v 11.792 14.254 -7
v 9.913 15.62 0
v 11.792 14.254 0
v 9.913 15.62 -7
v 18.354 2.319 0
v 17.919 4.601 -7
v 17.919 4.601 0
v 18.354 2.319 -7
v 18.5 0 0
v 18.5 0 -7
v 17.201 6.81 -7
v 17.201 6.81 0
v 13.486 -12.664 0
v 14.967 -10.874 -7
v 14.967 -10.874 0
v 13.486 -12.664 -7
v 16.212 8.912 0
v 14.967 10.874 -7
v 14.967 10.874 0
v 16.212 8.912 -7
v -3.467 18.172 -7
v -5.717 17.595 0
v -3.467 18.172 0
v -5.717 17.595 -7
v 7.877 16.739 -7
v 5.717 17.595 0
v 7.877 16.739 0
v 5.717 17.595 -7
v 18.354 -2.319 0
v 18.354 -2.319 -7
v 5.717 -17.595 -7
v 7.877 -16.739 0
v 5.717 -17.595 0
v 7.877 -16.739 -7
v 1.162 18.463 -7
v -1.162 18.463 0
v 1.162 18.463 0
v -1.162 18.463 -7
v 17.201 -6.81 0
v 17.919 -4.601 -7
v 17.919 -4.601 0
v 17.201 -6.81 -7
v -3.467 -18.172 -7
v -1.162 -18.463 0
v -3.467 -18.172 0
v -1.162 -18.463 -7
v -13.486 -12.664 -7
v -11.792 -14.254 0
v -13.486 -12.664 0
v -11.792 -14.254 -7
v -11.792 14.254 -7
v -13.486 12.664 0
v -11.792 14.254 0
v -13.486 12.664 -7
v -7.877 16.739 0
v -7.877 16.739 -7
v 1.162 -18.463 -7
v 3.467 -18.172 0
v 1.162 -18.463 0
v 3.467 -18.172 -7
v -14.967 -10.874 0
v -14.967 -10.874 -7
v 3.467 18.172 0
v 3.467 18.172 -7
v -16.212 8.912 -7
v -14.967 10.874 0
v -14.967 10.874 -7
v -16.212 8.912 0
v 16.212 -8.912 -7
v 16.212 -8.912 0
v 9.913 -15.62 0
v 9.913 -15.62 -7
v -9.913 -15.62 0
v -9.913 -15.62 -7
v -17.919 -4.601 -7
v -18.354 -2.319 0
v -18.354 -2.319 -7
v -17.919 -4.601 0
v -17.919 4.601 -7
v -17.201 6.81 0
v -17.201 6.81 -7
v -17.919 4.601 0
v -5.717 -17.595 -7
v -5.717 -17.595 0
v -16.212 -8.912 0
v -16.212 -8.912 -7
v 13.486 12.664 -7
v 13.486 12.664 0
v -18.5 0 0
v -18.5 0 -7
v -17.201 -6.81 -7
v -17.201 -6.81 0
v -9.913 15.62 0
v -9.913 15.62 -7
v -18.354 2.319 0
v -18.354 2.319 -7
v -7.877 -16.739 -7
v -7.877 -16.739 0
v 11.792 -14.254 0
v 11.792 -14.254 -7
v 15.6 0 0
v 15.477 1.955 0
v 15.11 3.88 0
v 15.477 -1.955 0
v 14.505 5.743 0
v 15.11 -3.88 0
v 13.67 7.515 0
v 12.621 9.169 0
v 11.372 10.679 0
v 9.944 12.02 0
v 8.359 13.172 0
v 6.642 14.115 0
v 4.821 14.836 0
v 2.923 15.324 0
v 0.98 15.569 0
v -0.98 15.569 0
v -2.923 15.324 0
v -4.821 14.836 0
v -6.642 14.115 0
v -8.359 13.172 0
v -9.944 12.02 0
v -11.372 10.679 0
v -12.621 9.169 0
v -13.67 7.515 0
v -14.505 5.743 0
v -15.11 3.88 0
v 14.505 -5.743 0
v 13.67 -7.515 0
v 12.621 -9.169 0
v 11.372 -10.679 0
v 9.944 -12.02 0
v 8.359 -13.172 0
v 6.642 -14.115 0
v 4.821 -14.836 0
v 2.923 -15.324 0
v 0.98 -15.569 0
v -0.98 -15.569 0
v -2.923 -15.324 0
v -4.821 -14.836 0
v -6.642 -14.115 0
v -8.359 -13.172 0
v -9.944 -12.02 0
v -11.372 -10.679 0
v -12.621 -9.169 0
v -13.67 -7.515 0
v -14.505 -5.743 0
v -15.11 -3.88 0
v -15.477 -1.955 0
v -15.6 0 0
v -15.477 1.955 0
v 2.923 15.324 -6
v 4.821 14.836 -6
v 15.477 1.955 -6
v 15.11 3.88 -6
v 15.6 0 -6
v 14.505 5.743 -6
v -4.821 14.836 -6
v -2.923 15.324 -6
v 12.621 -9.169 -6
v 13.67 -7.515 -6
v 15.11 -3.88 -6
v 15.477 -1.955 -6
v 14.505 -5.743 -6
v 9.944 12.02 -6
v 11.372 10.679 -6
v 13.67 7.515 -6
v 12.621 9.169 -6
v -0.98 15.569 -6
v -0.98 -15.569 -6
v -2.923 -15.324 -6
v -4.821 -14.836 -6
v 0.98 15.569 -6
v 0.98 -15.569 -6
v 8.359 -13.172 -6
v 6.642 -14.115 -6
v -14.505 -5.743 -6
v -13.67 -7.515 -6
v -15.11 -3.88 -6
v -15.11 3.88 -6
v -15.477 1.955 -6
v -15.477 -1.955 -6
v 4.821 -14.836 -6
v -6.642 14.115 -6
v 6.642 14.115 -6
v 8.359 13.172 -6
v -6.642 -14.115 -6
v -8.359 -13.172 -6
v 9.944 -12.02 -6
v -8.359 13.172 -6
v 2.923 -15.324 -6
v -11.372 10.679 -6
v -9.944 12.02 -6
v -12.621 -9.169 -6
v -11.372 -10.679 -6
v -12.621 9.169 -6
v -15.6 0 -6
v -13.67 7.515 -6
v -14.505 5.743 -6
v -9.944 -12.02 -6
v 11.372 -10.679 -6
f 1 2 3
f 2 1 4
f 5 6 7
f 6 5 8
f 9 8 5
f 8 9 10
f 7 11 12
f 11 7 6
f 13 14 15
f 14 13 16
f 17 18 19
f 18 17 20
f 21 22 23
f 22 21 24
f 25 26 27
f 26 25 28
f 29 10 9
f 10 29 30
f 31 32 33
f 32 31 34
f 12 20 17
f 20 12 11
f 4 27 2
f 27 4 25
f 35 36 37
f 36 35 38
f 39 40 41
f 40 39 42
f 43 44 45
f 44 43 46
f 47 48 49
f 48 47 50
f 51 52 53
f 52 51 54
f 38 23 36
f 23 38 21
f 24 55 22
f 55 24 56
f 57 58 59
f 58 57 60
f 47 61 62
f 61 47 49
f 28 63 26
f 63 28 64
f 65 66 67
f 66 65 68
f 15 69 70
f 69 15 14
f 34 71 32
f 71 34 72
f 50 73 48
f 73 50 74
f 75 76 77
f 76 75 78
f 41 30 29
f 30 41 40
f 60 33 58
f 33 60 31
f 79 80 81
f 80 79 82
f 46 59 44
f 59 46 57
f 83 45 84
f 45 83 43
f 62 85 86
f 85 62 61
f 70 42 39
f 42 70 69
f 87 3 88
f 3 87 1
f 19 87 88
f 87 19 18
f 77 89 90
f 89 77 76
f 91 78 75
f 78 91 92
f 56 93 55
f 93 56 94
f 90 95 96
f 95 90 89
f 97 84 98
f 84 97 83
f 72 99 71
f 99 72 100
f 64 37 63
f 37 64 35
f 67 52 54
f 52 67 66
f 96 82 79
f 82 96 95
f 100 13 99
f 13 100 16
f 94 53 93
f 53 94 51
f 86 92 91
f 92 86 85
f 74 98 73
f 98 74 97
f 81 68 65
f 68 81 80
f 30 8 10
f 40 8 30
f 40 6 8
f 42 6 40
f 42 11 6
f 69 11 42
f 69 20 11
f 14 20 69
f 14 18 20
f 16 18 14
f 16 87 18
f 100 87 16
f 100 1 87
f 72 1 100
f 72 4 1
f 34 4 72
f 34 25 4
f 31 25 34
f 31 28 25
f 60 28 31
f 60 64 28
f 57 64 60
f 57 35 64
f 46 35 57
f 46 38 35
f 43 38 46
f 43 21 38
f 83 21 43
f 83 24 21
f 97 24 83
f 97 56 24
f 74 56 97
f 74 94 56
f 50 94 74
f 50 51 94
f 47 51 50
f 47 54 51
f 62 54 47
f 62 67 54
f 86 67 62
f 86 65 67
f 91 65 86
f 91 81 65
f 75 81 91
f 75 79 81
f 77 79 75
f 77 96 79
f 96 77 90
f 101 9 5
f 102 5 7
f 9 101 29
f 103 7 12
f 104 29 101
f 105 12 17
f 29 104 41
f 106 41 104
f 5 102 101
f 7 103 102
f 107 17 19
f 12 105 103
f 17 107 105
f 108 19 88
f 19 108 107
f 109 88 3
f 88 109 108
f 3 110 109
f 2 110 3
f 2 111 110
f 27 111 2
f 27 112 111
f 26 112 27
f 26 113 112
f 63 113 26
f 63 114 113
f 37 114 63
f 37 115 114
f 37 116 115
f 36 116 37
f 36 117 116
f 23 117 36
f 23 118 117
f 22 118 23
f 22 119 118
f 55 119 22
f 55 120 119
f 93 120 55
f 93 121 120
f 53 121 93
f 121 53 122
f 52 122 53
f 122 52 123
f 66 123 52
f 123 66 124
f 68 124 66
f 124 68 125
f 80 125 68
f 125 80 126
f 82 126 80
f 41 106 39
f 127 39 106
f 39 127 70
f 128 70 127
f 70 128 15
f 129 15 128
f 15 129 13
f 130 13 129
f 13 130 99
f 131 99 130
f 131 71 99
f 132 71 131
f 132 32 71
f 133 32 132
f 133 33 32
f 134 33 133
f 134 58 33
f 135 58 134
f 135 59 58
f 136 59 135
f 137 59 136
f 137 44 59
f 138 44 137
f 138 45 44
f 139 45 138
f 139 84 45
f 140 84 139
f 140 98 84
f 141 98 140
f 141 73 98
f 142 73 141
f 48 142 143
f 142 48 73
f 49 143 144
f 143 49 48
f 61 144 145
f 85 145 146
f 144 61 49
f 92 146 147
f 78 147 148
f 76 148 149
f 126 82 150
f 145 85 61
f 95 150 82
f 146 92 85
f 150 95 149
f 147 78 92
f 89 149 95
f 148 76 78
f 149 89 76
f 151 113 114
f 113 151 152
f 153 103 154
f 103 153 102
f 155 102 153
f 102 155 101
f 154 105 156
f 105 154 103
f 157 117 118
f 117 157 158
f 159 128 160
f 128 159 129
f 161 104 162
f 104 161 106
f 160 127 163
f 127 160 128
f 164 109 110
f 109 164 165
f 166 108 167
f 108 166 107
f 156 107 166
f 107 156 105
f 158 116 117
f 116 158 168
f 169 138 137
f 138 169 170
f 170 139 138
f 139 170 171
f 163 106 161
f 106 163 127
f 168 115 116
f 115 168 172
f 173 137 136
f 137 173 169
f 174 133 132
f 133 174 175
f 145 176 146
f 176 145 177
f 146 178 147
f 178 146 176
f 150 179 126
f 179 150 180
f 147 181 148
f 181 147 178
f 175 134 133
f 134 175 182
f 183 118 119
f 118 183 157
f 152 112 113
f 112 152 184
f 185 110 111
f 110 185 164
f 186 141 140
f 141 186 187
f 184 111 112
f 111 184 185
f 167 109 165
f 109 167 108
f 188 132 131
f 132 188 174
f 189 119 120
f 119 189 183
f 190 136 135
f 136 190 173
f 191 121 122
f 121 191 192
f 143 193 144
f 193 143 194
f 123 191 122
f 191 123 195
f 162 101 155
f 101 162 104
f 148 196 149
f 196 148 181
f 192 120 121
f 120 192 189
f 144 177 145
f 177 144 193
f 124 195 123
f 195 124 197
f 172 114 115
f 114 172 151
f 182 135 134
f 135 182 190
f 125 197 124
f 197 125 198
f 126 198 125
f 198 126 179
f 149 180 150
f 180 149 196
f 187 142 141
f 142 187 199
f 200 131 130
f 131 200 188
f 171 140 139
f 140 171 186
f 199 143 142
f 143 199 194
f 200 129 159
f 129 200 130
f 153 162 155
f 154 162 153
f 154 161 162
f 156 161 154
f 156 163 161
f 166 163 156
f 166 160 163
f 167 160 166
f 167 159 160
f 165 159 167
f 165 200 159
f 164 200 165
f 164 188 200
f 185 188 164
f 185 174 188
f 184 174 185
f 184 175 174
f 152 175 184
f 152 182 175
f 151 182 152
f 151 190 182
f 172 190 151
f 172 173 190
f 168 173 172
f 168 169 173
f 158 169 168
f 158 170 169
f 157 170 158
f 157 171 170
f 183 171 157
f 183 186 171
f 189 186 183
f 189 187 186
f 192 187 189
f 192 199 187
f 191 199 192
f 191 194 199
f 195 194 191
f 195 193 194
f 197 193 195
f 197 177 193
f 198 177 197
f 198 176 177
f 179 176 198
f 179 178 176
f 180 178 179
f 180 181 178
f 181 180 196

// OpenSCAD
$fn = 50;


difference() {
	union() {
		translate(v = [0, 0, -7.0000000000]) {
			cylinder(h = 7, r = 18.5000000000);
		}
	}
	union() {
		#translate(v = [0, 0, -6.0000000000]) {
			cylinder(h = 6, r = 15.6000000000);
		}
	}
}
